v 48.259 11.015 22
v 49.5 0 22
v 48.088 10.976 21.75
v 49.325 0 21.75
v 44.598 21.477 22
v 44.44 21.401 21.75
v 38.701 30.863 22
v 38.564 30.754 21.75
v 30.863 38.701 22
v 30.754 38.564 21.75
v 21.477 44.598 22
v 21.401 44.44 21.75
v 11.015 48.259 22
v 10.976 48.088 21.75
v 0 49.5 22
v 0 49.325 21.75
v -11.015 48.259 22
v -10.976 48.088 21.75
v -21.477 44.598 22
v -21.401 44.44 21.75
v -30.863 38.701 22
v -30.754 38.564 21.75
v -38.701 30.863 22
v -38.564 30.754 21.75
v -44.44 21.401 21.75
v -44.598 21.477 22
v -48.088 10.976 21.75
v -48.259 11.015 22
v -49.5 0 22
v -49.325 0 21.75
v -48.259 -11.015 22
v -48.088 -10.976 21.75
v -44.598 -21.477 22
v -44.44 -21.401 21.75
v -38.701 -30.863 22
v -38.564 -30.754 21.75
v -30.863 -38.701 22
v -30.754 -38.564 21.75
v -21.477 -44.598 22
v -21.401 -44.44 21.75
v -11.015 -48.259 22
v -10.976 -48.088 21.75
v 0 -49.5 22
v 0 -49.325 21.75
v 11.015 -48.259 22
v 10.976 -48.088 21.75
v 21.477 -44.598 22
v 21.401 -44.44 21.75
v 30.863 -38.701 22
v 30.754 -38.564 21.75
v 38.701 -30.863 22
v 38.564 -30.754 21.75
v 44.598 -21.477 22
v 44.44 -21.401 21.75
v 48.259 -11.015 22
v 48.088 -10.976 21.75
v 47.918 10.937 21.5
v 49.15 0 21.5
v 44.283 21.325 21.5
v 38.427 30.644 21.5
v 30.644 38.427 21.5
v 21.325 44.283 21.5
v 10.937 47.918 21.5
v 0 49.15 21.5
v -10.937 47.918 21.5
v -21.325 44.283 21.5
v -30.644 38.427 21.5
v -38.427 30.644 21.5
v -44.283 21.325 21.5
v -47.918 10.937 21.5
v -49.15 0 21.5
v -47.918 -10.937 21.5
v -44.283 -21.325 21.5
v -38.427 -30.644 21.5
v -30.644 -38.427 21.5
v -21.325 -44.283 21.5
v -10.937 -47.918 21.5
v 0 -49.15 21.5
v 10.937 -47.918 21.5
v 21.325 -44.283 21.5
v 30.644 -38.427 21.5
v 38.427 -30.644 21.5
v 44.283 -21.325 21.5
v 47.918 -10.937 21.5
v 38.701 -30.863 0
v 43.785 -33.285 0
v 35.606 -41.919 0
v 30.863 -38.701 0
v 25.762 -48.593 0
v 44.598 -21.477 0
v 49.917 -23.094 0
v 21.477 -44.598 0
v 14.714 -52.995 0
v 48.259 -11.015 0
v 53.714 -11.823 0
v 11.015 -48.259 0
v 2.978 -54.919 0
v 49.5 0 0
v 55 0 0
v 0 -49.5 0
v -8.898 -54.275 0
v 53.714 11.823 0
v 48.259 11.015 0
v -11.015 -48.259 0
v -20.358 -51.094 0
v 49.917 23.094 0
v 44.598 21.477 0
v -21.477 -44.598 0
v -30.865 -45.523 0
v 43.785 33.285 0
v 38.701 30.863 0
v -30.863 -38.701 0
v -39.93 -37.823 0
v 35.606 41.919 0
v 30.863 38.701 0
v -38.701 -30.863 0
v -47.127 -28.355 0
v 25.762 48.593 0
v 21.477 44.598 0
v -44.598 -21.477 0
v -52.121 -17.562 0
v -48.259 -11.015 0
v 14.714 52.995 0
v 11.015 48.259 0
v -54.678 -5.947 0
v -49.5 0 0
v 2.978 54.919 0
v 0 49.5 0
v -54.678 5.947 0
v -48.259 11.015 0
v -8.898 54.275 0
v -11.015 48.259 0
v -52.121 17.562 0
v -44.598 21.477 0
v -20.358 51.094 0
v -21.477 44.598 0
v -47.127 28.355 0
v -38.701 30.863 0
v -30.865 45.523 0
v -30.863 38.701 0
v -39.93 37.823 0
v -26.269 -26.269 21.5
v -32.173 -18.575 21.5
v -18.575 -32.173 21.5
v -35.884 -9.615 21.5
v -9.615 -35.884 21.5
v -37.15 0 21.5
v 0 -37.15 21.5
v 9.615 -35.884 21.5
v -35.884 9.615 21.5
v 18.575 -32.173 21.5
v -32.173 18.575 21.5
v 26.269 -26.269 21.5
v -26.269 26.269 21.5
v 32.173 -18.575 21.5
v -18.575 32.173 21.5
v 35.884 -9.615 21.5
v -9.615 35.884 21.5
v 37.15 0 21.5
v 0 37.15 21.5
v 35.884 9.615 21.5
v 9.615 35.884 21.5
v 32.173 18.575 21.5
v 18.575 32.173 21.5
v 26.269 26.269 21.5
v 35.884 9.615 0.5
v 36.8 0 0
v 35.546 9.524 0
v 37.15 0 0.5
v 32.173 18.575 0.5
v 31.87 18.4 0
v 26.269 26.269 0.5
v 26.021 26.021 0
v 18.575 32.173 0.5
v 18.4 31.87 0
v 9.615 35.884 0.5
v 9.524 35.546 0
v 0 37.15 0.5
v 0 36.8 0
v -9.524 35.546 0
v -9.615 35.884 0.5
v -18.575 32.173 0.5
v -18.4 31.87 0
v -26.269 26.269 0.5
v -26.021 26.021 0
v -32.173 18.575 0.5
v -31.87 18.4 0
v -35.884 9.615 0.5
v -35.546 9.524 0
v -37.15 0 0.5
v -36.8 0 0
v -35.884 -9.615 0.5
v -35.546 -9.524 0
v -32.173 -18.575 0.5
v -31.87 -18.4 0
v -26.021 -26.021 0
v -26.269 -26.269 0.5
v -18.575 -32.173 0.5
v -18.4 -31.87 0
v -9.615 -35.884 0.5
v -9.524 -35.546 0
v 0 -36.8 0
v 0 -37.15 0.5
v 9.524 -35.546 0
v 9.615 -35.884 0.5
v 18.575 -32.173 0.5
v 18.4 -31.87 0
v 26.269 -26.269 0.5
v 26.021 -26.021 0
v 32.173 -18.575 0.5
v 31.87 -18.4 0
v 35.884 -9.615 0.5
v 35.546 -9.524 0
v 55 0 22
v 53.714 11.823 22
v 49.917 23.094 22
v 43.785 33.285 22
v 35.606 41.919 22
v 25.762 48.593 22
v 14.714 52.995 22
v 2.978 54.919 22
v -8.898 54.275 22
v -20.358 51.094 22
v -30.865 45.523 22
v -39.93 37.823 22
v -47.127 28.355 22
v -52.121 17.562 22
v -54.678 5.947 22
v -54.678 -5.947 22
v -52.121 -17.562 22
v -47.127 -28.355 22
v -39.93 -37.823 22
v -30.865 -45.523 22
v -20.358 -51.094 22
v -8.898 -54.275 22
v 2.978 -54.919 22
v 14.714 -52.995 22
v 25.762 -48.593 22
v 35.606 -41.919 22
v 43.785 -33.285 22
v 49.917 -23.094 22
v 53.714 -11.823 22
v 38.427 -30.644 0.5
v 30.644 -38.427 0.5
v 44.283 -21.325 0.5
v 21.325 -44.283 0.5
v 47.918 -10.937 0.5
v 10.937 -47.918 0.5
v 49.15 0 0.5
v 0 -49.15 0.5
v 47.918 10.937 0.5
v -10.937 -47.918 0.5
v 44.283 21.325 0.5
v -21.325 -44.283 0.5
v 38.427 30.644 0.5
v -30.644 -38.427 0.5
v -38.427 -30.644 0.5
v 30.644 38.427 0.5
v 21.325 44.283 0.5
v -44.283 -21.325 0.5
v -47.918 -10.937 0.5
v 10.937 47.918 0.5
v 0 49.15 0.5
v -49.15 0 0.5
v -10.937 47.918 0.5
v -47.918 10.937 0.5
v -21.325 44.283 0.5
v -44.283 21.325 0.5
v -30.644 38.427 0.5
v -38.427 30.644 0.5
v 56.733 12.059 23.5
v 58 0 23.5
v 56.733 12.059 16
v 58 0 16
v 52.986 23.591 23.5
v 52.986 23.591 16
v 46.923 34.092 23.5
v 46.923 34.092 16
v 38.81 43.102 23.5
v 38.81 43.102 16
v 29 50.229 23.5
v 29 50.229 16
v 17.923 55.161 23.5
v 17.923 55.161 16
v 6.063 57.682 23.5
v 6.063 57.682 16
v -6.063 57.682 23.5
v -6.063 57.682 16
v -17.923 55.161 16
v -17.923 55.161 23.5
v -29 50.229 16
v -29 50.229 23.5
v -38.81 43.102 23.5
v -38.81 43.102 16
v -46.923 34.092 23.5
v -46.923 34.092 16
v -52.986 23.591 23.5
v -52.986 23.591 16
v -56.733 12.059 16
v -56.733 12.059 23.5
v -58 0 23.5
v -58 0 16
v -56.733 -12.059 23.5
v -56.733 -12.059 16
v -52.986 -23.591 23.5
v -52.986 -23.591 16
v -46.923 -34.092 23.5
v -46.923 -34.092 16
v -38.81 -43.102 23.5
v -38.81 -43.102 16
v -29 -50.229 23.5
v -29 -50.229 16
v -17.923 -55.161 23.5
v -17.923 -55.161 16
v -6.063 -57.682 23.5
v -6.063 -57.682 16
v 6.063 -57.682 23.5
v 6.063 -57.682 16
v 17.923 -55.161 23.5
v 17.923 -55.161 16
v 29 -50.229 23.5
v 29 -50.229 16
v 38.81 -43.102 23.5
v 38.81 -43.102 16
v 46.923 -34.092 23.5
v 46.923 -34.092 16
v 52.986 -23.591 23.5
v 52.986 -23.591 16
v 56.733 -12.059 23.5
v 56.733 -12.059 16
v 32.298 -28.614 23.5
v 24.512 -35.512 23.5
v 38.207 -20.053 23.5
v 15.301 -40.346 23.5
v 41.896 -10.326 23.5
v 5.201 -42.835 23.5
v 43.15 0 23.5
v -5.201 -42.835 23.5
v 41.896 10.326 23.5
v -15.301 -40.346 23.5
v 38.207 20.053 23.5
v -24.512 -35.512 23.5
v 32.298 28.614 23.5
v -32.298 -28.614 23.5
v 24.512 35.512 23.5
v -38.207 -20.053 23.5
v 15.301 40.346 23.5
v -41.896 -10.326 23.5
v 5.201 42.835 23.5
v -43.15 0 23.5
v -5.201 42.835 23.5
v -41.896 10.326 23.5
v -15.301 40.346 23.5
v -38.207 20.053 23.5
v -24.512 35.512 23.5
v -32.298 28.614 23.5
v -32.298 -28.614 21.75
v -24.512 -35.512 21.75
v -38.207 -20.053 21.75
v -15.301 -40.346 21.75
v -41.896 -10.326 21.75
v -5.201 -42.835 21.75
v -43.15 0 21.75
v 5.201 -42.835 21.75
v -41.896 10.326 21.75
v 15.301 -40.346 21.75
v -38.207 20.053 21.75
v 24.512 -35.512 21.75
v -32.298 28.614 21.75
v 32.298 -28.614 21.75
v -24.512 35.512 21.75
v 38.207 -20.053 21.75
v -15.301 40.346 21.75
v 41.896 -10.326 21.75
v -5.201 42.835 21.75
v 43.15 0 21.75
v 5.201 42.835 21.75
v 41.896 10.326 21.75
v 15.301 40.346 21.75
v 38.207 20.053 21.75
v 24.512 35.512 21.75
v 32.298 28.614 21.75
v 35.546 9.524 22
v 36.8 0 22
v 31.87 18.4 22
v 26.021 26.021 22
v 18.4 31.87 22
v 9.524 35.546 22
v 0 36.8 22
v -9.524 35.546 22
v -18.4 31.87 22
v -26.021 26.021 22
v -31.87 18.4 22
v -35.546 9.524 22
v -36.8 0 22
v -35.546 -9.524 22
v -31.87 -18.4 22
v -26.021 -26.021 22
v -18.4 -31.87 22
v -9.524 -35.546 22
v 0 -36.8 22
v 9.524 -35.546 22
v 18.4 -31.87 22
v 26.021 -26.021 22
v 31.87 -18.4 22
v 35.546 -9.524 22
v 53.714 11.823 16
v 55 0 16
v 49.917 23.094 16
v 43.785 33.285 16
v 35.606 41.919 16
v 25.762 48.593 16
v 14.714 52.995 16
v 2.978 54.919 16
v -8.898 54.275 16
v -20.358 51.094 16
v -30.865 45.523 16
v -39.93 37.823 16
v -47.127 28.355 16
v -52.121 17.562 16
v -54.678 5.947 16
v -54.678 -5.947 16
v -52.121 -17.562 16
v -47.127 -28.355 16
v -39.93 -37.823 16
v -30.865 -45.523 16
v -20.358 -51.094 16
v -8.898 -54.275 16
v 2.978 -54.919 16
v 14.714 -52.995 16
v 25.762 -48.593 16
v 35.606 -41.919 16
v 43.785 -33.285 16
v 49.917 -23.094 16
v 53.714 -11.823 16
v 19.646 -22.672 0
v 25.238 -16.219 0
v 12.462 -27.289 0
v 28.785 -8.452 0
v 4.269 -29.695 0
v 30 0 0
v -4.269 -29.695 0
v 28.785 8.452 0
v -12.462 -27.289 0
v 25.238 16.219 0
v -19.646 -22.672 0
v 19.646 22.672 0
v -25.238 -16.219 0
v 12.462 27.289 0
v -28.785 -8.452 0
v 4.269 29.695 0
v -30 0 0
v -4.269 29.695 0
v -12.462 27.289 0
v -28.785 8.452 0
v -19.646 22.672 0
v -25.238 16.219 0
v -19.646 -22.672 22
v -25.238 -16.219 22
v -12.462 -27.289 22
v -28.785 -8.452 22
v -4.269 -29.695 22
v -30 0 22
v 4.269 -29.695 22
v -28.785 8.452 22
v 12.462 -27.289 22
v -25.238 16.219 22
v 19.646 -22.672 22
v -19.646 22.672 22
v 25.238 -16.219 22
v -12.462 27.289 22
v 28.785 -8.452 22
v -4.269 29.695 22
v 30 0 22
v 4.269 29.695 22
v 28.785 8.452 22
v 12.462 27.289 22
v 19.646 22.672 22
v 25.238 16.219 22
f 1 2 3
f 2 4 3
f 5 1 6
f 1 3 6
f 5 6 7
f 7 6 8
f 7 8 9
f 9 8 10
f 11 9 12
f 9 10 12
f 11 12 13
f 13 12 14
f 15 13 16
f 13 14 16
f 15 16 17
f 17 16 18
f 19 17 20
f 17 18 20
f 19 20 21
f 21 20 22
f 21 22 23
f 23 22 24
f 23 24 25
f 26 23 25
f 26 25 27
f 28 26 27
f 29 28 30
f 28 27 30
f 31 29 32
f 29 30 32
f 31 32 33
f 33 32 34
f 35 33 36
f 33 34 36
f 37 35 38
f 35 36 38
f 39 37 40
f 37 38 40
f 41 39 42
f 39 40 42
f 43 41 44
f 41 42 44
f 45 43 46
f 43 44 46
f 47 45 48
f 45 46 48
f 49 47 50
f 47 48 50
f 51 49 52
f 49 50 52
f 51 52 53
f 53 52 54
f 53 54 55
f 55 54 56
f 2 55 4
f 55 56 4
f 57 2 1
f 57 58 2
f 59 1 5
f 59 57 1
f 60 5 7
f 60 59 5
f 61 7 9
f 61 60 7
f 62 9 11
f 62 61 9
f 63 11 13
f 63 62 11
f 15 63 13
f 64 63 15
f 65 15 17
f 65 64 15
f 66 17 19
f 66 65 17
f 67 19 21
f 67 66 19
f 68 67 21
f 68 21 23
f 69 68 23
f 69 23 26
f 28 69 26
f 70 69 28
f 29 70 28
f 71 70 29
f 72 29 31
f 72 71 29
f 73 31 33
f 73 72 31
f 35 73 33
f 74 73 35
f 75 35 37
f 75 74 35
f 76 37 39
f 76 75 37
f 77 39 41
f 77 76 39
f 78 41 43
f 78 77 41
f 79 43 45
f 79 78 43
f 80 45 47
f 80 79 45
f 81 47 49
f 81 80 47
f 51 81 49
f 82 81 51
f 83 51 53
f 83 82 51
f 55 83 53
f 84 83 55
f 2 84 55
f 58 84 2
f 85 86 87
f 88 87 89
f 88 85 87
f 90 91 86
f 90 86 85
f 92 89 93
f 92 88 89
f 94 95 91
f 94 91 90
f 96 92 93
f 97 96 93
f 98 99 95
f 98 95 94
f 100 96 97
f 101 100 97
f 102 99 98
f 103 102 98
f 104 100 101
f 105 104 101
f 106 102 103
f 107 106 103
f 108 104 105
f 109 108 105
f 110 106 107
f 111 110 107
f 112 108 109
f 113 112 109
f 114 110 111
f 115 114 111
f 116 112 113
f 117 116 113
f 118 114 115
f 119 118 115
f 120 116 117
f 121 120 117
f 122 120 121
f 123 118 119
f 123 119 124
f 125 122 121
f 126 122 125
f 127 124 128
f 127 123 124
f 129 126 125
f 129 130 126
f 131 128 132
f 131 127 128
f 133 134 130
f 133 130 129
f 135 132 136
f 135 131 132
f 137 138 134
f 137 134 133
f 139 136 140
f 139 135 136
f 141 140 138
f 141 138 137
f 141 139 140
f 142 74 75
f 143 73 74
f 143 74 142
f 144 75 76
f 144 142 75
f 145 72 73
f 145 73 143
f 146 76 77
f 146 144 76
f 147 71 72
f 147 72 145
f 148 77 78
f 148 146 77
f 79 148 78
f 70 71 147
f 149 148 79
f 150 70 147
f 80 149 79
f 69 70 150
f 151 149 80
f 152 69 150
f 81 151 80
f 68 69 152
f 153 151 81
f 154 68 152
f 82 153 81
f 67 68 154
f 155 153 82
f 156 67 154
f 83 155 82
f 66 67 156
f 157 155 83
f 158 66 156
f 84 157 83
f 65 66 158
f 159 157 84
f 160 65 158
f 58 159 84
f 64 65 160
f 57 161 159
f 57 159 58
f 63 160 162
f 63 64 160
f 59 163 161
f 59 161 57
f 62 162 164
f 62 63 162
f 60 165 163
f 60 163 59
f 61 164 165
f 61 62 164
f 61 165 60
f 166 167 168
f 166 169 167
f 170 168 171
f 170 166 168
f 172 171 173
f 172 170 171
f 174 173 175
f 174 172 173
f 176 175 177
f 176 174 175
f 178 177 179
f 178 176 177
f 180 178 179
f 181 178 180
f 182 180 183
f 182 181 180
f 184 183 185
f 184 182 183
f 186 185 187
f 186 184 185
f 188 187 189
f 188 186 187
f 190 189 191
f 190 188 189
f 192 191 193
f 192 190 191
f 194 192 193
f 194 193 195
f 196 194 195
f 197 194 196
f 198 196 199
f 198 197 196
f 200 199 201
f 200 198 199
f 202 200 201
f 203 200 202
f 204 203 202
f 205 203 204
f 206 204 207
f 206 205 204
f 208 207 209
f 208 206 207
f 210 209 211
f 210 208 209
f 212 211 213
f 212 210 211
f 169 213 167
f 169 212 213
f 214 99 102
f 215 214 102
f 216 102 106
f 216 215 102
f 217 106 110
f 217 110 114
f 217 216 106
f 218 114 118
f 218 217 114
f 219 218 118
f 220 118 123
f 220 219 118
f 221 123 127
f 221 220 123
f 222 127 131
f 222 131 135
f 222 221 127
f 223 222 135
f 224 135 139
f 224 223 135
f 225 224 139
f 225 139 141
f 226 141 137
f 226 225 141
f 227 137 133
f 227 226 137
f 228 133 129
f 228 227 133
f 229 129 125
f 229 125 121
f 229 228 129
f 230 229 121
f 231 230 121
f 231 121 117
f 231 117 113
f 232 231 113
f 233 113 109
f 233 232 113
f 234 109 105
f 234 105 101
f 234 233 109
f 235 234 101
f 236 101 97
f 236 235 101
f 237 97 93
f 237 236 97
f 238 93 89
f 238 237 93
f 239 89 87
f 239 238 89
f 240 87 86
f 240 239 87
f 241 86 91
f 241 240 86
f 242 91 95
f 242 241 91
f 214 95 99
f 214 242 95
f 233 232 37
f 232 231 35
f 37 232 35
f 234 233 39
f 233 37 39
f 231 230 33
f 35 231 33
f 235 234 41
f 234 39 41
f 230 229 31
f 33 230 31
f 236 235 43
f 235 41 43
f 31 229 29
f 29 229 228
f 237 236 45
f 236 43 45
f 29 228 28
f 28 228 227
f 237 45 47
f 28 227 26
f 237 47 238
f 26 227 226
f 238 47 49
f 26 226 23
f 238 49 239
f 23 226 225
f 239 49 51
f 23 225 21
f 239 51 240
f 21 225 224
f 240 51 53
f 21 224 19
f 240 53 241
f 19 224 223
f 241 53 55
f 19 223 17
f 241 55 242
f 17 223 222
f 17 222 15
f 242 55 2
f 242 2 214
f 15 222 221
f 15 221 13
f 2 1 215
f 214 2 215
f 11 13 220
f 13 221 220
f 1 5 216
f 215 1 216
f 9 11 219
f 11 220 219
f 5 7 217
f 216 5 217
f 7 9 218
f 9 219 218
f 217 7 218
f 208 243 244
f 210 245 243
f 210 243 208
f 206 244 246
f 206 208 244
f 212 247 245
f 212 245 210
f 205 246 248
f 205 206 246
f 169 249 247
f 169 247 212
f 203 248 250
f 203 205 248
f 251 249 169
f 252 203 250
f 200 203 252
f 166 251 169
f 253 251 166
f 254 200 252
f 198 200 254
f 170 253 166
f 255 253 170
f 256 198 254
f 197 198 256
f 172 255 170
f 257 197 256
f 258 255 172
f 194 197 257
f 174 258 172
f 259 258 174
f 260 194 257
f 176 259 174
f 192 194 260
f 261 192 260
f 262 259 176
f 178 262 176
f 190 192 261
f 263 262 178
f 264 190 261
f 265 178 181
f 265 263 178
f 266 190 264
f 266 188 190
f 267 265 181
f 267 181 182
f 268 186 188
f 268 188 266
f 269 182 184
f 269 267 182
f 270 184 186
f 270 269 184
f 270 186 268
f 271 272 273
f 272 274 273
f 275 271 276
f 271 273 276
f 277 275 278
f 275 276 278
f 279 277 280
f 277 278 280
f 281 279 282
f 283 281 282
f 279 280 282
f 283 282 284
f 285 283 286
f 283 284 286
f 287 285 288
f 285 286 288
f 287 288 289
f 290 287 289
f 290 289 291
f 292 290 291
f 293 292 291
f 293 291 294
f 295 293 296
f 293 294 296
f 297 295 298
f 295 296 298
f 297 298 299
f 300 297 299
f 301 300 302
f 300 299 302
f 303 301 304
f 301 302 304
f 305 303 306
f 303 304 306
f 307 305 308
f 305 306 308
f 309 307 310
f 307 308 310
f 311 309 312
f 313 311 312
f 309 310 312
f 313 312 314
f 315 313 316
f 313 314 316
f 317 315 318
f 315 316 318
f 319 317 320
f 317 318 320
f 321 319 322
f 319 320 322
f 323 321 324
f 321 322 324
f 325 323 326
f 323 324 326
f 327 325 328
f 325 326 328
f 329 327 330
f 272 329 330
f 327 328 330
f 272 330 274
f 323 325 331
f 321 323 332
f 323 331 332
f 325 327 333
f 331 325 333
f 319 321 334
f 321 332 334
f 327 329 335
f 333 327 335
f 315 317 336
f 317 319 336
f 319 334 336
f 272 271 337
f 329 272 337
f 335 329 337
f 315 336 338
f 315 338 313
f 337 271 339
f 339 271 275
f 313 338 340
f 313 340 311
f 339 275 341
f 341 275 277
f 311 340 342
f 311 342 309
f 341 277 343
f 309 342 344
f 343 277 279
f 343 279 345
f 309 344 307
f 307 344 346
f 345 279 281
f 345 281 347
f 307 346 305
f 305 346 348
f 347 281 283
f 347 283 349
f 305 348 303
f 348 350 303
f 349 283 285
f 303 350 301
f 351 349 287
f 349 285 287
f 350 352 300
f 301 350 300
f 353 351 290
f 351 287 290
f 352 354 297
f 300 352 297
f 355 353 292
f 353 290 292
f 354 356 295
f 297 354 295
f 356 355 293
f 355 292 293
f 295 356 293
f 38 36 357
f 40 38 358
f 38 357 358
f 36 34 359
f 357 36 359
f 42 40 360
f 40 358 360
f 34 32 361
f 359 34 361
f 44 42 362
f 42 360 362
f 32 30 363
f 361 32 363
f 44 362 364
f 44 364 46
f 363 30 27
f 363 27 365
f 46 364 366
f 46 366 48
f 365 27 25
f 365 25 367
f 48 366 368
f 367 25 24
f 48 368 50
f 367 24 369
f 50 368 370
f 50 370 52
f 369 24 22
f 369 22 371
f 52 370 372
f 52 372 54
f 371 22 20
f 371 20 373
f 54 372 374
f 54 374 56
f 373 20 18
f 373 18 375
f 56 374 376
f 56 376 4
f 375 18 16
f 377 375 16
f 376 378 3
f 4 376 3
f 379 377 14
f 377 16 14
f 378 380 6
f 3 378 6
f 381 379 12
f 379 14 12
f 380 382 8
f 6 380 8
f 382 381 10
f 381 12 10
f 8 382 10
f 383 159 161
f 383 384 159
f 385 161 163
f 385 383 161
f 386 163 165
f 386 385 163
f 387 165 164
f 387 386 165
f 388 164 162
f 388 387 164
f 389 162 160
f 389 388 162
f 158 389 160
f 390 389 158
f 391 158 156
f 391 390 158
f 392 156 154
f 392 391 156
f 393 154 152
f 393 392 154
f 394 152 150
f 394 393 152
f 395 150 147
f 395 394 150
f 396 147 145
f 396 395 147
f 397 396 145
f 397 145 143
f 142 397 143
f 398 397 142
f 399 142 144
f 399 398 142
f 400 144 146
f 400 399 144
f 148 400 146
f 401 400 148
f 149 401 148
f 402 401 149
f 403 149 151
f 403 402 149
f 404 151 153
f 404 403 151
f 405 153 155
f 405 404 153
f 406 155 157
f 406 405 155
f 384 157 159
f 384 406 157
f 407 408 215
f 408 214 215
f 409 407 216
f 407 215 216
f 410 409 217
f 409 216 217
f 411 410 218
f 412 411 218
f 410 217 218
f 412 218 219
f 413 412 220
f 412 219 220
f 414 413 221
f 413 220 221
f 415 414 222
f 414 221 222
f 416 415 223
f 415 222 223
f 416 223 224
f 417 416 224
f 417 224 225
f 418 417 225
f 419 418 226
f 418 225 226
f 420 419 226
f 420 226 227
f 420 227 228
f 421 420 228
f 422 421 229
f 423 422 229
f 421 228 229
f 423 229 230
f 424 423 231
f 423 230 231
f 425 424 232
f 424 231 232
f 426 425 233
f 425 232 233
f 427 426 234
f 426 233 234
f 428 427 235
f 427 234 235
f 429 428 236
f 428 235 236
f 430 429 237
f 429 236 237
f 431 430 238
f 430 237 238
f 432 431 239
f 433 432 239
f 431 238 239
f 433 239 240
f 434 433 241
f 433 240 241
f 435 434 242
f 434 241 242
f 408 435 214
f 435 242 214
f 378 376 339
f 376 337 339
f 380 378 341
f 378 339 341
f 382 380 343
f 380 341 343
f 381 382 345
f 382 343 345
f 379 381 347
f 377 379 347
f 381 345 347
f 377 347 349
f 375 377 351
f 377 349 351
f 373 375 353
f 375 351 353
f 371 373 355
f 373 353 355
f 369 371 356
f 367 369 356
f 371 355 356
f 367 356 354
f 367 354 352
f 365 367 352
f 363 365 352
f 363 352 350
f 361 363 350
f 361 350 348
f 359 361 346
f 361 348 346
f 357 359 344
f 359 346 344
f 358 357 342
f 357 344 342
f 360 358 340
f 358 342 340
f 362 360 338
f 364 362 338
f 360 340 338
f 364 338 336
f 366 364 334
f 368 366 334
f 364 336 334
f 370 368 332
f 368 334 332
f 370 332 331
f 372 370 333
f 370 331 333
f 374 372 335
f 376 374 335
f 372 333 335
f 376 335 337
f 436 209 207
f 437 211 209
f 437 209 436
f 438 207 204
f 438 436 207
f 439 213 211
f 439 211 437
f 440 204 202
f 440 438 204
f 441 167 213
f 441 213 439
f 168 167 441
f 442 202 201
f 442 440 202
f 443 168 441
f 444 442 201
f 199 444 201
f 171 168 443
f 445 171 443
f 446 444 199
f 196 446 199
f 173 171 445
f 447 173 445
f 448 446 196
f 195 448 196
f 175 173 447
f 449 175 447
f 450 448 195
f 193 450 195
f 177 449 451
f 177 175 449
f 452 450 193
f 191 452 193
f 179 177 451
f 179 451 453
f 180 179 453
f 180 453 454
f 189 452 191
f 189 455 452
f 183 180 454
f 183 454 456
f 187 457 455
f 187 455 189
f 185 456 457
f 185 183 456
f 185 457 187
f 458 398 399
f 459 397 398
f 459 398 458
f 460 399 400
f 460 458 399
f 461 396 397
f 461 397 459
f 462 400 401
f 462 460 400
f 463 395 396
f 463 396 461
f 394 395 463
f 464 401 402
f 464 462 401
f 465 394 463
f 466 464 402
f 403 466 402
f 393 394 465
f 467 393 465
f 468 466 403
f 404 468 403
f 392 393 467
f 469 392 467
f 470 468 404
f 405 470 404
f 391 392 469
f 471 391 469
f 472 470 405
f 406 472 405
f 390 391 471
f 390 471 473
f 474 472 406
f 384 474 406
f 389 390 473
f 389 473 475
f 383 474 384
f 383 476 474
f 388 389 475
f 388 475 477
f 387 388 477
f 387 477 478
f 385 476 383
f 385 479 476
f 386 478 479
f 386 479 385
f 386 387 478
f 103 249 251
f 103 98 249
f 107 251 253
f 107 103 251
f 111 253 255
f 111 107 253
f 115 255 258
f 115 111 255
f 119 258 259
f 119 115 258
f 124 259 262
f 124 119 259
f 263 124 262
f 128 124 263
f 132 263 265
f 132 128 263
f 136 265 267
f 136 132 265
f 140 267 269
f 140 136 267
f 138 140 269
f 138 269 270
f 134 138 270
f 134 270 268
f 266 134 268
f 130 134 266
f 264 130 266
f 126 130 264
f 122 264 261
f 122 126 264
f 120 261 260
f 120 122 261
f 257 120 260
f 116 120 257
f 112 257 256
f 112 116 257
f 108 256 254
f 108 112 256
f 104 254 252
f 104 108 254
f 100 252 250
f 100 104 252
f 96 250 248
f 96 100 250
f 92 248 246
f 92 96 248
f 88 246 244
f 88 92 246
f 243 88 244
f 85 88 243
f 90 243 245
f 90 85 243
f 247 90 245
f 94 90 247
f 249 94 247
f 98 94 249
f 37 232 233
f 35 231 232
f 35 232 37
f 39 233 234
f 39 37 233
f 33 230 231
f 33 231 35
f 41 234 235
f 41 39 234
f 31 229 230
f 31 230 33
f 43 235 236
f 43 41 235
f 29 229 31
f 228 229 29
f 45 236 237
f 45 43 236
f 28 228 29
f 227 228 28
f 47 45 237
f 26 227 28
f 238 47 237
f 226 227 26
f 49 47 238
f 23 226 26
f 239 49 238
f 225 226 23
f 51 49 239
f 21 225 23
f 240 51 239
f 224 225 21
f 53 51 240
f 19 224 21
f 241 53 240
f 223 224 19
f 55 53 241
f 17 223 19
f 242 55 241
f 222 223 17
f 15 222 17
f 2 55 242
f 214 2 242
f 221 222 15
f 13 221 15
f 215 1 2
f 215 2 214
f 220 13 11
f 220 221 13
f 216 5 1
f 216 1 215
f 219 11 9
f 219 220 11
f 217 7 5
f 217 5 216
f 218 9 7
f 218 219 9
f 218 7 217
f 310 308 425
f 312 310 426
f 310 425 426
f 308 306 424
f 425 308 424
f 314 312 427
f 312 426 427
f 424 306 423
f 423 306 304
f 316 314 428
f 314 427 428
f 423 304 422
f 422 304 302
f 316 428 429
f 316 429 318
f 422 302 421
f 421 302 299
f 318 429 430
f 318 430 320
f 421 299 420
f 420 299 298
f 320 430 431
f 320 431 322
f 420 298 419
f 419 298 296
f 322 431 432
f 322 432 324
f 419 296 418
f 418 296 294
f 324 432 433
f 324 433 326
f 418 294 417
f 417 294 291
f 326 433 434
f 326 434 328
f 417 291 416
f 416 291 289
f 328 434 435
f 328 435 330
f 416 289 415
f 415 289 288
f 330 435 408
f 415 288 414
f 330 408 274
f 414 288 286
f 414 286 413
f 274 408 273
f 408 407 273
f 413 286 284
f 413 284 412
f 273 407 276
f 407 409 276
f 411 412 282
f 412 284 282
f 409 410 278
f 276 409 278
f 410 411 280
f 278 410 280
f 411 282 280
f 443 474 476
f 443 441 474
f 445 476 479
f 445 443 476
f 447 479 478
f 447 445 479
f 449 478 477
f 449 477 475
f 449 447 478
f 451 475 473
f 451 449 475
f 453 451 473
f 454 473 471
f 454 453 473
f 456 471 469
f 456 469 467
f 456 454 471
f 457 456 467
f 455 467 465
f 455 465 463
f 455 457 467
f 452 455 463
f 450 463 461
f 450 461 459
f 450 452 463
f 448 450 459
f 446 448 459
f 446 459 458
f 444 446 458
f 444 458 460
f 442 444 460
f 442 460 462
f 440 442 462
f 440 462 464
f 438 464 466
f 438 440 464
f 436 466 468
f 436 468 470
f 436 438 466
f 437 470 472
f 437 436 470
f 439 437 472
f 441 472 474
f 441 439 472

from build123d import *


with BuildPart() as body:
    # Sketch (on XZ_Plane of Origin) → Revolution (revolve)
    with BuildSketch(Plane.XZ):
        Polygon((30, 22), (30, 0), (36.799792, 0), (37.149896, 0.5), (49.149896, 0.5), (49.5, 0), (55, 0), (55, 22), (49.5, 22), (49.149896, 21.5), (37.149896, 21.5), (36.799792, 22), align=None)
    revolve(axis=Axis((0, 0, 0), (0, 0, 1)))


with BuildPart() as body001:
    # Sketch001 (on XZ_Plane001 of Origin002) → Revolution001 (revolve)
    with BuildSketch(Plane.XZ):
        Polygon((55, 16), (55, 22), (49.5, 22), (49.324948, 21.75), (43.149896, 21.75), (43.149896, 23.5), (58, 23.5), (58, 16), align=None)
    revolve(axis=Axis((0, 0, 0), (0, 0, 1)))


solid = Compound([body.part, body001.part])
